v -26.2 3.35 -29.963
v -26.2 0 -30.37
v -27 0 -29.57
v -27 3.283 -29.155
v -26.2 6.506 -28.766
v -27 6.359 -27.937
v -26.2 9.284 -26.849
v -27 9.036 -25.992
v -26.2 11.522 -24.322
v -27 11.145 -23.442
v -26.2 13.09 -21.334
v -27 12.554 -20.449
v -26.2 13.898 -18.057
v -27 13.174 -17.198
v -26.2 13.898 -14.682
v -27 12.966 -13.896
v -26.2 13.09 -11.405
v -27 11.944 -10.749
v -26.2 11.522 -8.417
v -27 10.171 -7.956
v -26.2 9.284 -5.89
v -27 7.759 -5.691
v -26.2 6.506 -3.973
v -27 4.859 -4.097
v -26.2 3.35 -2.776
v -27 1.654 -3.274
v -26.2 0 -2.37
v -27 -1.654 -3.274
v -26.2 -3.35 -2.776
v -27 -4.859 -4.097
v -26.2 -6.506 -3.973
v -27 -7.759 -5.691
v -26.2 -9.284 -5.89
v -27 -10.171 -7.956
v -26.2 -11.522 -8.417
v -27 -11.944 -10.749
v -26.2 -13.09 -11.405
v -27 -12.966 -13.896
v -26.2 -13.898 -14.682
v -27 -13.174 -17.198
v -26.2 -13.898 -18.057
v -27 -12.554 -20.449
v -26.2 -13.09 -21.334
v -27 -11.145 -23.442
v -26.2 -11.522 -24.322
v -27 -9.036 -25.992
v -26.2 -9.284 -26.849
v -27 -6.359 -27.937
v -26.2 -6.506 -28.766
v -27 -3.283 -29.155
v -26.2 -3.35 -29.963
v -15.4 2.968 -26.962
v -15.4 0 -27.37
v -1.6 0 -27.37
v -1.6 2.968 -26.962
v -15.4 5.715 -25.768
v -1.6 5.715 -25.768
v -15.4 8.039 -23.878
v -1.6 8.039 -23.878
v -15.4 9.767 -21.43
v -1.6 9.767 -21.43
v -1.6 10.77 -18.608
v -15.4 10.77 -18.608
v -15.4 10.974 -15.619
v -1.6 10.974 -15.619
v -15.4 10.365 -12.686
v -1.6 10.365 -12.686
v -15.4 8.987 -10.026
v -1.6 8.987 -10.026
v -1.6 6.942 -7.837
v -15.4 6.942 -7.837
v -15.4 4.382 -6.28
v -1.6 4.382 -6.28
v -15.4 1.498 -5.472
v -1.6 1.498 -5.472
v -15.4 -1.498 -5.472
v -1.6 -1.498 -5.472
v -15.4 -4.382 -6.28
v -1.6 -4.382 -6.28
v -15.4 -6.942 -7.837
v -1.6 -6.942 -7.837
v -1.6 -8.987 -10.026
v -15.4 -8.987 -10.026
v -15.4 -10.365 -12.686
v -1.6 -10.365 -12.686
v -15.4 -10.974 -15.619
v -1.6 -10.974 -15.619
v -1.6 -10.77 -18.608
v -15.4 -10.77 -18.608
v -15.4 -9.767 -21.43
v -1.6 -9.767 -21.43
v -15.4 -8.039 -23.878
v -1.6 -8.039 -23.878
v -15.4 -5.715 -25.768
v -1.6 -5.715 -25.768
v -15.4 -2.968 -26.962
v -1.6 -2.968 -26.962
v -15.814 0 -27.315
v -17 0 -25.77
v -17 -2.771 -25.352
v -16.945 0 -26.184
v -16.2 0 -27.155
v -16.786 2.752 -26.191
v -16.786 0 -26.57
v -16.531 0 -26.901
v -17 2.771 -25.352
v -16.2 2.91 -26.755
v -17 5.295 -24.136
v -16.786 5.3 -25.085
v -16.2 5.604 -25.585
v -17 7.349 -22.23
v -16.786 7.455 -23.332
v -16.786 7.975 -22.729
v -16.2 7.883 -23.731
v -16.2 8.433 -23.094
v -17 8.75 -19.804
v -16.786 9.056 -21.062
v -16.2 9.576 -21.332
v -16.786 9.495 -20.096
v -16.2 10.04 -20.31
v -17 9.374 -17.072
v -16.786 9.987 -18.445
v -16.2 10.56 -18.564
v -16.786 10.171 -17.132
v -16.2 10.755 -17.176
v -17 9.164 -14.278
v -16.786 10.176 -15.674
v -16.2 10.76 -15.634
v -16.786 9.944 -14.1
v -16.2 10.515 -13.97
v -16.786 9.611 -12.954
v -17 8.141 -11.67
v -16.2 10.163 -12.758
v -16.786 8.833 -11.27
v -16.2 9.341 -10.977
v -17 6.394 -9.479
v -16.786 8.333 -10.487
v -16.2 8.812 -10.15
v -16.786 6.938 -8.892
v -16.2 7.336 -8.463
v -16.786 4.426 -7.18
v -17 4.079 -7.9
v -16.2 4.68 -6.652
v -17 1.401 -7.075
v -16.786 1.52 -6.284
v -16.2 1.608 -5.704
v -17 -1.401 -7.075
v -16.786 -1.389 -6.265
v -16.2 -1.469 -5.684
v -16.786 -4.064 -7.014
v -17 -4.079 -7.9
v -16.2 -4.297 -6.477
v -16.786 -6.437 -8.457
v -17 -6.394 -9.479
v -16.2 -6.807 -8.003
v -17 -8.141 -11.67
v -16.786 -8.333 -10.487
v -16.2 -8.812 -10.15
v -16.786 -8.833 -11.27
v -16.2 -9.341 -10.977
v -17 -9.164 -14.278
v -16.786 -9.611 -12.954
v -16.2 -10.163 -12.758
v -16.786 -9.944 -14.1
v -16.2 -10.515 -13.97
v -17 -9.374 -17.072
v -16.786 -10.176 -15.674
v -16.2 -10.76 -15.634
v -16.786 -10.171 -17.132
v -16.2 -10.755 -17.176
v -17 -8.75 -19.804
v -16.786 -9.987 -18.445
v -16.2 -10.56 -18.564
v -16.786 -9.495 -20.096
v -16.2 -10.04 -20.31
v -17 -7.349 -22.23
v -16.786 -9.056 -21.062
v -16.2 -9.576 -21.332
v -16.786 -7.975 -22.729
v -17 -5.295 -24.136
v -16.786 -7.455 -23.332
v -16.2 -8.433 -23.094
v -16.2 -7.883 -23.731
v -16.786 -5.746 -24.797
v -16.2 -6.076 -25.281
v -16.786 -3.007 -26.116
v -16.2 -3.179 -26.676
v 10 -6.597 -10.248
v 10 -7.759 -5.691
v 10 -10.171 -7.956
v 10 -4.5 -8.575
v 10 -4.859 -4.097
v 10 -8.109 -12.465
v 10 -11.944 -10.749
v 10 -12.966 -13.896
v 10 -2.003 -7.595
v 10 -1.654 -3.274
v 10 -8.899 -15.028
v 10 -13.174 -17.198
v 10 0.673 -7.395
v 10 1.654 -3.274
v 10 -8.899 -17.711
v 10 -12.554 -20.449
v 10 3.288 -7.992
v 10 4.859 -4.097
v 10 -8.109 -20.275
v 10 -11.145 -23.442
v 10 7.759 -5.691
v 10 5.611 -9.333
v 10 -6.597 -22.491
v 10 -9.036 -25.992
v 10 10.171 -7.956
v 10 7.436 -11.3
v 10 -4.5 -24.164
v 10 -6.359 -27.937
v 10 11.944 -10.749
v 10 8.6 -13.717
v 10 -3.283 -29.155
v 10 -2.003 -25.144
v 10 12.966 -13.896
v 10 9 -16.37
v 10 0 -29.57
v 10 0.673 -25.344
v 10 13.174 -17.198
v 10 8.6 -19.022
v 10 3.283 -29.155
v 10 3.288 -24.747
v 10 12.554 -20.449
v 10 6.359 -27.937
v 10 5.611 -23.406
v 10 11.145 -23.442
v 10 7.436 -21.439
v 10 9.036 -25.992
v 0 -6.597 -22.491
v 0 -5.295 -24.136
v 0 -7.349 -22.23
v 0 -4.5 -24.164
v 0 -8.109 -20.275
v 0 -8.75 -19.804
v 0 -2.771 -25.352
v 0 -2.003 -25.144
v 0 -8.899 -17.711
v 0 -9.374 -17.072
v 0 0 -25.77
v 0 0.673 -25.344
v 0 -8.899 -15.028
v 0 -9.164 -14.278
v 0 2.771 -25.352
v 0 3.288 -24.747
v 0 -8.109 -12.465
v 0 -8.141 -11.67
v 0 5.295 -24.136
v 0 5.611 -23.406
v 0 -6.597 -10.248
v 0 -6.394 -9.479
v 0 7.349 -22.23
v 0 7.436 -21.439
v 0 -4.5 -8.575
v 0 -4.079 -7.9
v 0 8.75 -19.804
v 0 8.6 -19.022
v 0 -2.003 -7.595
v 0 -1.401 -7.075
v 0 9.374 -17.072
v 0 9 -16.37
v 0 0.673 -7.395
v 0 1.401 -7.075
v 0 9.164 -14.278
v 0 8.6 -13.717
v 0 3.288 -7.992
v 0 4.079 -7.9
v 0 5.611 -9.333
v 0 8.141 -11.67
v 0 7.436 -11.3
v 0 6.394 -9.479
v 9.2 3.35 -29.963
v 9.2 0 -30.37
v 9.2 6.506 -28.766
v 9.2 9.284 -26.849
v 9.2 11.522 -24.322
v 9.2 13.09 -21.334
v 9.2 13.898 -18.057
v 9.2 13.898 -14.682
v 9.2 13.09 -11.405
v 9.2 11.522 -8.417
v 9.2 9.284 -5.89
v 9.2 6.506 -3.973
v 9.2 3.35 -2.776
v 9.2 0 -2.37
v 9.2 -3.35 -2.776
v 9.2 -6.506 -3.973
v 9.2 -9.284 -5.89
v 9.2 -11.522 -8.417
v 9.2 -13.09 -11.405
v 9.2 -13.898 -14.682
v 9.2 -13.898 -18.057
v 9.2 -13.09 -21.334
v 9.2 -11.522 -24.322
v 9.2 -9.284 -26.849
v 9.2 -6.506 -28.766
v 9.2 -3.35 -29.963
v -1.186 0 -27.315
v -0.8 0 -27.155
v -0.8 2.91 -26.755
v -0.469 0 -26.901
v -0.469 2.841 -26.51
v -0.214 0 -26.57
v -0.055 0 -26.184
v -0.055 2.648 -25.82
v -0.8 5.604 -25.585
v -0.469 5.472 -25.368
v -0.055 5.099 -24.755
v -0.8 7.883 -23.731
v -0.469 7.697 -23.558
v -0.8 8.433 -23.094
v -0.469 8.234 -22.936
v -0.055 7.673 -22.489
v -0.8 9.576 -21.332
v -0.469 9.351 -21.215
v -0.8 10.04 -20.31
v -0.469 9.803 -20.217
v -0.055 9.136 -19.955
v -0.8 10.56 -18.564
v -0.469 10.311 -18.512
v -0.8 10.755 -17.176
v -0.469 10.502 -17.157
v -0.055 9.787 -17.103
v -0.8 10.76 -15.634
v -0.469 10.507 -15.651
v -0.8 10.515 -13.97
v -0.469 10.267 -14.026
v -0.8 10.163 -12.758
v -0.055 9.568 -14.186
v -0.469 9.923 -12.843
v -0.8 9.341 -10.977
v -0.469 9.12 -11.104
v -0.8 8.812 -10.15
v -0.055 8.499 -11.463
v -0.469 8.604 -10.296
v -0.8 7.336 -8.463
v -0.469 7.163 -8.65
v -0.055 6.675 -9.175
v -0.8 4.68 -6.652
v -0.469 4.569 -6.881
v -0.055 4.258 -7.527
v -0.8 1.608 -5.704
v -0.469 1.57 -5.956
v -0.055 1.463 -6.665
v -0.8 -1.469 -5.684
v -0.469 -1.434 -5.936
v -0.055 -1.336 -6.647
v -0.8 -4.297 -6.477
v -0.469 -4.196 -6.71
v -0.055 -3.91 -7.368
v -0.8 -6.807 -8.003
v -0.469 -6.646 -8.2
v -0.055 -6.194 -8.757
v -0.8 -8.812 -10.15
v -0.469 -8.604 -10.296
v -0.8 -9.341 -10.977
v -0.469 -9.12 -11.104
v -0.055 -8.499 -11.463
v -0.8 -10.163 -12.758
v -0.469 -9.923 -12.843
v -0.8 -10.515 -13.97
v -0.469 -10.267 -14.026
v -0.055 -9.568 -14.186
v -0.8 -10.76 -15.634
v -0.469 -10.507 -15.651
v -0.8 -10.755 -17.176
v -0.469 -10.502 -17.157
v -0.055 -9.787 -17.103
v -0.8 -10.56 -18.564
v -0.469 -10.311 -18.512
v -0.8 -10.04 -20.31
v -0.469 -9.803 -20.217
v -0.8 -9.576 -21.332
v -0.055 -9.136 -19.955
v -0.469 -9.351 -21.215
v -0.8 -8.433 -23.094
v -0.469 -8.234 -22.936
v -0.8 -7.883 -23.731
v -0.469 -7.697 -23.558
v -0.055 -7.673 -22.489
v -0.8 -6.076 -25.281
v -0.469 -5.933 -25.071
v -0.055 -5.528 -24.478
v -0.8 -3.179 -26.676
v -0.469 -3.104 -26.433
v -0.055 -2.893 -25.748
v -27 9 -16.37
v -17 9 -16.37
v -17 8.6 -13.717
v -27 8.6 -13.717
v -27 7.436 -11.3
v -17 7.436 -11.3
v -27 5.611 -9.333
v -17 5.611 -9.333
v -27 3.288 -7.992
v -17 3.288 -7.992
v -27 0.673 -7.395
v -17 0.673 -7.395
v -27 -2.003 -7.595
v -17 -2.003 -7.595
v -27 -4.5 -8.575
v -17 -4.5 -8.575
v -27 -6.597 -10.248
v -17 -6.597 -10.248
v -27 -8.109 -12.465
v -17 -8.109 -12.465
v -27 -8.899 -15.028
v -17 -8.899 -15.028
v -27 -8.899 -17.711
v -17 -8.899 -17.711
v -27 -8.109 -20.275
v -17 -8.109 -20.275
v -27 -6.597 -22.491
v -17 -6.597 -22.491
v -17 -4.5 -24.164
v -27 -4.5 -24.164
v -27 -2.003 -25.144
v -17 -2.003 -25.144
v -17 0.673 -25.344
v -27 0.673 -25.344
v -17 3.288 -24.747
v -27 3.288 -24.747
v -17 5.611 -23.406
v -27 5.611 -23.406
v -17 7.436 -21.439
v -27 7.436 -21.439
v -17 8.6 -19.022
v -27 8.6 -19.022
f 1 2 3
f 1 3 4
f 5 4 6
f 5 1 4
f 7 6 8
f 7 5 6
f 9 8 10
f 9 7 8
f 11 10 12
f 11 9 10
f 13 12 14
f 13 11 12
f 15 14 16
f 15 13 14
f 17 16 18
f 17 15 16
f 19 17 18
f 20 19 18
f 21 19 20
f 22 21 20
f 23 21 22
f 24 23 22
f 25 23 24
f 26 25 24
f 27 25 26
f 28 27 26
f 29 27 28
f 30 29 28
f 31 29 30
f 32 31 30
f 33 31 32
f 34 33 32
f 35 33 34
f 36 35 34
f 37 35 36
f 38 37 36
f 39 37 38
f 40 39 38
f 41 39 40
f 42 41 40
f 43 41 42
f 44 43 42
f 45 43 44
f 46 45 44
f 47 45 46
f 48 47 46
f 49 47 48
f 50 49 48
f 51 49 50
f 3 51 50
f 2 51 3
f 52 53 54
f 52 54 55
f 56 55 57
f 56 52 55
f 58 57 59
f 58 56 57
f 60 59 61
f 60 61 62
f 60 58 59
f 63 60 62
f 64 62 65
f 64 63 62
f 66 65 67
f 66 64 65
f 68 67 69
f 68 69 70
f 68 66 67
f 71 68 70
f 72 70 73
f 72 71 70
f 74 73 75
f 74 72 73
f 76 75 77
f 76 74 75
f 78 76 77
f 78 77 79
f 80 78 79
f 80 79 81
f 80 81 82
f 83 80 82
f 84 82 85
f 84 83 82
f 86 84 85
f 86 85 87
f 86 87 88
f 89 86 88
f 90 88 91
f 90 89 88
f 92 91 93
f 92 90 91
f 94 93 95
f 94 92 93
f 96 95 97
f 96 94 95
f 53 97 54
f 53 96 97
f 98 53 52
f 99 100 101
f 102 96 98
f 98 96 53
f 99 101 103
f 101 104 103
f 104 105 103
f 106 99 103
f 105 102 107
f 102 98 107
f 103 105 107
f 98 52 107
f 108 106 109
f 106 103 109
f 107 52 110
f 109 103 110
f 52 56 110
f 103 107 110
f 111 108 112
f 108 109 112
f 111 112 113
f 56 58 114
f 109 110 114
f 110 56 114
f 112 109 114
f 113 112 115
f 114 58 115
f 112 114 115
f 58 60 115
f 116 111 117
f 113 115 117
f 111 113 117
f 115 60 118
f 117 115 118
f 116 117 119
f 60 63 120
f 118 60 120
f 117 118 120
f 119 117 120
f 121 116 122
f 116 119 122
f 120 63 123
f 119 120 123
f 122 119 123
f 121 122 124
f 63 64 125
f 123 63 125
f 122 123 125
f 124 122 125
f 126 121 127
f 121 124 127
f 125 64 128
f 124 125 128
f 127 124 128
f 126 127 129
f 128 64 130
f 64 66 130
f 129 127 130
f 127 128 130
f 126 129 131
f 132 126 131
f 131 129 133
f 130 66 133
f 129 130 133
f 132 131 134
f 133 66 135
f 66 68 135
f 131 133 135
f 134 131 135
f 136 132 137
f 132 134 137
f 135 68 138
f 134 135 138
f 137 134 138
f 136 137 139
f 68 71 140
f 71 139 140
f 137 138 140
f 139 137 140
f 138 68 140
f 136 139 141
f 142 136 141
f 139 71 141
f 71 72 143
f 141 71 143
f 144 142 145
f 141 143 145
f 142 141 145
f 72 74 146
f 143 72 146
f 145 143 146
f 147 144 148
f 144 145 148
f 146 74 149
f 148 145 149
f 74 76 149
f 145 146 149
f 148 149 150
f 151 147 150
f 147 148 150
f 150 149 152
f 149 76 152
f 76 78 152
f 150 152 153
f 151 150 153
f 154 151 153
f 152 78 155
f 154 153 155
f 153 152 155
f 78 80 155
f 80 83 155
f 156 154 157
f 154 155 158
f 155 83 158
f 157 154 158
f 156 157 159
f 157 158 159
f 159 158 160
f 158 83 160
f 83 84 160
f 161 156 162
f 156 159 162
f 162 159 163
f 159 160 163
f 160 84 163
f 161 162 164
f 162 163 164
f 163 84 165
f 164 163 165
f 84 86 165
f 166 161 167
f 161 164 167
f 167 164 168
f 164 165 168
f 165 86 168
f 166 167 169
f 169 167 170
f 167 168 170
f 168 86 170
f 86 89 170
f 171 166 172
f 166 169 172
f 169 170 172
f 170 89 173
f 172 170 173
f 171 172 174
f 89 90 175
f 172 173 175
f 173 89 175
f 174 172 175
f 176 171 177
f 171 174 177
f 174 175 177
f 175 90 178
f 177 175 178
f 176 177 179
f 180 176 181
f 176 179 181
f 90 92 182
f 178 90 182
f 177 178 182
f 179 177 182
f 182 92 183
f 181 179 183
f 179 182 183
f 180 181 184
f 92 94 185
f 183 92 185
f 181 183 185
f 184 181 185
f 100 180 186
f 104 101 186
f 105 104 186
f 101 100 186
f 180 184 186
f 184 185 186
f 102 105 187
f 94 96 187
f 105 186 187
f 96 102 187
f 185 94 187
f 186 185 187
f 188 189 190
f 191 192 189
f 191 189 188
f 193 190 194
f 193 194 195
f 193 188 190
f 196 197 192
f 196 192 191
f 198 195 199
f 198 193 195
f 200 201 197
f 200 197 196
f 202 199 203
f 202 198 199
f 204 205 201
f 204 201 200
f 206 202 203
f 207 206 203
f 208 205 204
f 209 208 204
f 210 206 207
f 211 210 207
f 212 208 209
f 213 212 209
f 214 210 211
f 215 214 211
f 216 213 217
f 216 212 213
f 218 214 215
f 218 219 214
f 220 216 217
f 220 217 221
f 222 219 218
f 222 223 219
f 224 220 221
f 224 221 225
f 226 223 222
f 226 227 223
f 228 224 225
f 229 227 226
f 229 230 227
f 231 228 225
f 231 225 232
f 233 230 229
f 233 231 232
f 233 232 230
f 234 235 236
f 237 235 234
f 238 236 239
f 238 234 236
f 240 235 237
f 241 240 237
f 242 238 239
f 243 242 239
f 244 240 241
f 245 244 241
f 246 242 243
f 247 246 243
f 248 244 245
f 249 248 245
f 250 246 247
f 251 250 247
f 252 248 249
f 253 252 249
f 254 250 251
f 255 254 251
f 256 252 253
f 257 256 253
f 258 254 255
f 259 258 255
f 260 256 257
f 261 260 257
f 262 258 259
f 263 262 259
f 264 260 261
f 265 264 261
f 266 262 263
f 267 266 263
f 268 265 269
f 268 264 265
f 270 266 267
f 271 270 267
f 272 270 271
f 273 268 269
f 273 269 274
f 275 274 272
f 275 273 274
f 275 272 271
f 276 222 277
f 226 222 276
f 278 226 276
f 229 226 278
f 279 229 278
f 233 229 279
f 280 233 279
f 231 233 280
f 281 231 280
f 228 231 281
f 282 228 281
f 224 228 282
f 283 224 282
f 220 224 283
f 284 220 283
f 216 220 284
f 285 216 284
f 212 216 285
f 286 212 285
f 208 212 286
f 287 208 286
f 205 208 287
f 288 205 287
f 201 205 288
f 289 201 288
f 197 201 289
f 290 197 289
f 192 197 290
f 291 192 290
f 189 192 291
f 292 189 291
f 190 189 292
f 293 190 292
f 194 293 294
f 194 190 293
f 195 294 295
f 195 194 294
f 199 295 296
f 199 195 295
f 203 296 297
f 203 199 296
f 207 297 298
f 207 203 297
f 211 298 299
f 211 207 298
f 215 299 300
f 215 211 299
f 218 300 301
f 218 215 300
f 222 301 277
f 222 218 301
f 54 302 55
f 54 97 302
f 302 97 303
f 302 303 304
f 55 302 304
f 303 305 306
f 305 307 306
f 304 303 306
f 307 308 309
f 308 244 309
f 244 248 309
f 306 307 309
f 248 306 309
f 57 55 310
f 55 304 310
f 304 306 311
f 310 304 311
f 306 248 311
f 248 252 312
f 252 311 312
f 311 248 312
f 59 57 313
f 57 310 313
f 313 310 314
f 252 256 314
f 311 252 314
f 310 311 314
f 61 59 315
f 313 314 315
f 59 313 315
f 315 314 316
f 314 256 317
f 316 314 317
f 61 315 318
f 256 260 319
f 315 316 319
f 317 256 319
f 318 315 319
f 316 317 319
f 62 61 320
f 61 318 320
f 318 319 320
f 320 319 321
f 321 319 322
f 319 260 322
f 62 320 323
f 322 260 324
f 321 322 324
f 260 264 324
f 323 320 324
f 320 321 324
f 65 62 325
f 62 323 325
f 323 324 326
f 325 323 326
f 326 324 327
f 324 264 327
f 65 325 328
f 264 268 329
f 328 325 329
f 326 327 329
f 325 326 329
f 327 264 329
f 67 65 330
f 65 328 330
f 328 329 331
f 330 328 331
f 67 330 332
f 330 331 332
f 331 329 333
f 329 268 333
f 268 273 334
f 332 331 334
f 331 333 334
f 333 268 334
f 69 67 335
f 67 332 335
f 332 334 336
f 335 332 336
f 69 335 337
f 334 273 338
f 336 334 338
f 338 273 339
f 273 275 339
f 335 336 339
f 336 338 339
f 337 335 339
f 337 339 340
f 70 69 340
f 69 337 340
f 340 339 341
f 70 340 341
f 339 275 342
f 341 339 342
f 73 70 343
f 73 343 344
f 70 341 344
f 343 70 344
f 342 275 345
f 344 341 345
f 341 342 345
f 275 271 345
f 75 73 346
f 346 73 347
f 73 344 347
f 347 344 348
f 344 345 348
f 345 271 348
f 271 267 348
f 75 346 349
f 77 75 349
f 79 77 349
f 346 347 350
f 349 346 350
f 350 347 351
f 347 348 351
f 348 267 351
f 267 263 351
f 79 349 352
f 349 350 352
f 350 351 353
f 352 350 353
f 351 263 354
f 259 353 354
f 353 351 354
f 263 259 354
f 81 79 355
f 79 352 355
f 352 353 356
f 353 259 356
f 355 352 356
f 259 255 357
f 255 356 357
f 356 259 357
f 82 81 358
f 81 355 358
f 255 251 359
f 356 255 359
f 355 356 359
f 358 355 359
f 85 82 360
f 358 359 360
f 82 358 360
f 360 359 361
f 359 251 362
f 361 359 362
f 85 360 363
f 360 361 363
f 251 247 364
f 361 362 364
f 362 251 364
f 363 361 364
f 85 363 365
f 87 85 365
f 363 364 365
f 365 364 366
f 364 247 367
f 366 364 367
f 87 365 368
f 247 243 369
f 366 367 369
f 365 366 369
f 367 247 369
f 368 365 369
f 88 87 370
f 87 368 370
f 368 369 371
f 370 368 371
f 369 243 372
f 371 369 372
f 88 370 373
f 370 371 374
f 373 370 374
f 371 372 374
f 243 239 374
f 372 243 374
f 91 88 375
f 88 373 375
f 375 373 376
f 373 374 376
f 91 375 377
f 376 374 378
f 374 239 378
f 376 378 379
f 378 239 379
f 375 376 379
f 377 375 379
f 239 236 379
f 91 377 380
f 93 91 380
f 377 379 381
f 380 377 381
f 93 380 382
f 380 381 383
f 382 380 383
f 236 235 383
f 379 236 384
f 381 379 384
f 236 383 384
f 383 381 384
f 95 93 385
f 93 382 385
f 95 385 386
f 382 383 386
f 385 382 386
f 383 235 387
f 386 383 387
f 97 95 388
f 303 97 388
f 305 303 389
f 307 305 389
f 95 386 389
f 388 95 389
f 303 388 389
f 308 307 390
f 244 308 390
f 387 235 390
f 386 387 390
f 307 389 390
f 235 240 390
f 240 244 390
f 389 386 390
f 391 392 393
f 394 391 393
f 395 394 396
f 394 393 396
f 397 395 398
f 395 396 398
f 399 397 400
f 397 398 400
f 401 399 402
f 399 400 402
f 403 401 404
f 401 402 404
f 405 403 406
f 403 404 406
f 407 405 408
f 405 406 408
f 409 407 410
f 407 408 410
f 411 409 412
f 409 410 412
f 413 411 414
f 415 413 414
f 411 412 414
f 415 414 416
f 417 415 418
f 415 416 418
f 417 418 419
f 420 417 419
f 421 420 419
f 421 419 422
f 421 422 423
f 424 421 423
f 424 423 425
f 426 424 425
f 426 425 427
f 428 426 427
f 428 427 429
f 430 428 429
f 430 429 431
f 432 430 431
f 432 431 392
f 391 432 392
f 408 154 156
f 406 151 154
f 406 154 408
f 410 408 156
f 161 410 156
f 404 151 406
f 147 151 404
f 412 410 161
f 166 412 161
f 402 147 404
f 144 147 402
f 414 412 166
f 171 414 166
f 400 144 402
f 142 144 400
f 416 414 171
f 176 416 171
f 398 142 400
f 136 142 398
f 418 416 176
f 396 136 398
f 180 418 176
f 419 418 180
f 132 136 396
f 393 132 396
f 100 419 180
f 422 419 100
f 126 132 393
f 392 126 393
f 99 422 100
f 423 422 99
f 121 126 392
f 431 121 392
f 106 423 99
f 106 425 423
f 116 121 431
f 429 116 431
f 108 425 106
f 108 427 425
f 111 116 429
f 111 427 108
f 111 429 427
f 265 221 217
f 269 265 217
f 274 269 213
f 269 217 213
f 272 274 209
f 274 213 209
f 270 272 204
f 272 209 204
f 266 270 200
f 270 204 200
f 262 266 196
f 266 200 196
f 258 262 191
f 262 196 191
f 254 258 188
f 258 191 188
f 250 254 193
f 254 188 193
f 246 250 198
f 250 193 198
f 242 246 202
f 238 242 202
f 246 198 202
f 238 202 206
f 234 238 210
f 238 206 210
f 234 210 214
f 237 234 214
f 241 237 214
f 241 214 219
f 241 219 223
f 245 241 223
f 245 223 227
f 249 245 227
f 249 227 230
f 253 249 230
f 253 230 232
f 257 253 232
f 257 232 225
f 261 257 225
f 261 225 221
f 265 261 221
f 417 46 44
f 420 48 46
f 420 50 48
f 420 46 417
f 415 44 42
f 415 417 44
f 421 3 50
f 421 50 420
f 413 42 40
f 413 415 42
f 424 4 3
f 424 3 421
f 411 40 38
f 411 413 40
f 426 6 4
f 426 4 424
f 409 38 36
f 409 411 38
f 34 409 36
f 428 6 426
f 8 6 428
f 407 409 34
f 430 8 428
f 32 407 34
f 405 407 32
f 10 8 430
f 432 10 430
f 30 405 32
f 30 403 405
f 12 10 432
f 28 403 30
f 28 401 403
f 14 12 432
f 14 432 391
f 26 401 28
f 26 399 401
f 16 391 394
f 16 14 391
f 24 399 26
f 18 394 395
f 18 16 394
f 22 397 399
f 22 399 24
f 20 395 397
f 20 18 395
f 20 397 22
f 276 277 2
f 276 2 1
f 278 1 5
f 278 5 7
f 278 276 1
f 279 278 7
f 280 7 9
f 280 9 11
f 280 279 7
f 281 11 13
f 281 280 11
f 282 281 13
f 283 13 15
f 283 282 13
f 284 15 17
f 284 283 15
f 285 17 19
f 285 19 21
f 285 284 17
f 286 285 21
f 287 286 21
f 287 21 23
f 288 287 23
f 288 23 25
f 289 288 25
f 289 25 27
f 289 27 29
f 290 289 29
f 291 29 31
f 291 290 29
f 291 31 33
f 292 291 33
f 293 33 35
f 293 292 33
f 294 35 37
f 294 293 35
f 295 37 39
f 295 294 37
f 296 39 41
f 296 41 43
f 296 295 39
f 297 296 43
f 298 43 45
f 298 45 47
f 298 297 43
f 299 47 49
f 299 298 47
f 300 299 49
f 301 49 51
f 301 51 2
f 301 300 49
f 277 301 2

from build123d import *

# Parameters (mm, degrees)
F2_R     = 9
F3_DEPTH = 37
F4_SIZE  = 0.8
F5_R     = 1.6


with BuildPart() as f1:
    # F0 (on Front) → F1 (revolve)
    with BuildSketch(Plane.XZ):
        Polygon((-17, -16.36958538), (-27, -16.36958538), (-27, -30.36958538), (10, -30.36958538), (10, -16.36958538), (0, -16.36958538), (0, -27.36958538), (-17, -27.36958538), align=None)
    revolve(axis=Axis((-22, 0, -16.36958538), (1, 0, 0)))

    # F2 (on face) → F3 (cut)
    with BuildSketch(Plane.YZ.offset(10)):
        with Locations((0, -16.36958538)):
            Circle(F2_R)
    extrude(amount=-F3_DEPTH, mode=Mode.SUBTRACT)

    # F4
    f4_edges = [f1.edges().sort_by_distance(p)[0] for p in [
        (10, 0, -2.369585),
        (-27, 0, -2.369585),
    ]]
    chamfer(f4_edges, length=F4_SIZE)

    # F5
    f5_edges = [f1.edges().sort_by_distance(p)[0] for p in [
        (-17, 0, -5.369585),
        (0, 0, -5.369585),
    ]]
    fillet(f5_edges, radius=F5_R)


solid = f1.part
